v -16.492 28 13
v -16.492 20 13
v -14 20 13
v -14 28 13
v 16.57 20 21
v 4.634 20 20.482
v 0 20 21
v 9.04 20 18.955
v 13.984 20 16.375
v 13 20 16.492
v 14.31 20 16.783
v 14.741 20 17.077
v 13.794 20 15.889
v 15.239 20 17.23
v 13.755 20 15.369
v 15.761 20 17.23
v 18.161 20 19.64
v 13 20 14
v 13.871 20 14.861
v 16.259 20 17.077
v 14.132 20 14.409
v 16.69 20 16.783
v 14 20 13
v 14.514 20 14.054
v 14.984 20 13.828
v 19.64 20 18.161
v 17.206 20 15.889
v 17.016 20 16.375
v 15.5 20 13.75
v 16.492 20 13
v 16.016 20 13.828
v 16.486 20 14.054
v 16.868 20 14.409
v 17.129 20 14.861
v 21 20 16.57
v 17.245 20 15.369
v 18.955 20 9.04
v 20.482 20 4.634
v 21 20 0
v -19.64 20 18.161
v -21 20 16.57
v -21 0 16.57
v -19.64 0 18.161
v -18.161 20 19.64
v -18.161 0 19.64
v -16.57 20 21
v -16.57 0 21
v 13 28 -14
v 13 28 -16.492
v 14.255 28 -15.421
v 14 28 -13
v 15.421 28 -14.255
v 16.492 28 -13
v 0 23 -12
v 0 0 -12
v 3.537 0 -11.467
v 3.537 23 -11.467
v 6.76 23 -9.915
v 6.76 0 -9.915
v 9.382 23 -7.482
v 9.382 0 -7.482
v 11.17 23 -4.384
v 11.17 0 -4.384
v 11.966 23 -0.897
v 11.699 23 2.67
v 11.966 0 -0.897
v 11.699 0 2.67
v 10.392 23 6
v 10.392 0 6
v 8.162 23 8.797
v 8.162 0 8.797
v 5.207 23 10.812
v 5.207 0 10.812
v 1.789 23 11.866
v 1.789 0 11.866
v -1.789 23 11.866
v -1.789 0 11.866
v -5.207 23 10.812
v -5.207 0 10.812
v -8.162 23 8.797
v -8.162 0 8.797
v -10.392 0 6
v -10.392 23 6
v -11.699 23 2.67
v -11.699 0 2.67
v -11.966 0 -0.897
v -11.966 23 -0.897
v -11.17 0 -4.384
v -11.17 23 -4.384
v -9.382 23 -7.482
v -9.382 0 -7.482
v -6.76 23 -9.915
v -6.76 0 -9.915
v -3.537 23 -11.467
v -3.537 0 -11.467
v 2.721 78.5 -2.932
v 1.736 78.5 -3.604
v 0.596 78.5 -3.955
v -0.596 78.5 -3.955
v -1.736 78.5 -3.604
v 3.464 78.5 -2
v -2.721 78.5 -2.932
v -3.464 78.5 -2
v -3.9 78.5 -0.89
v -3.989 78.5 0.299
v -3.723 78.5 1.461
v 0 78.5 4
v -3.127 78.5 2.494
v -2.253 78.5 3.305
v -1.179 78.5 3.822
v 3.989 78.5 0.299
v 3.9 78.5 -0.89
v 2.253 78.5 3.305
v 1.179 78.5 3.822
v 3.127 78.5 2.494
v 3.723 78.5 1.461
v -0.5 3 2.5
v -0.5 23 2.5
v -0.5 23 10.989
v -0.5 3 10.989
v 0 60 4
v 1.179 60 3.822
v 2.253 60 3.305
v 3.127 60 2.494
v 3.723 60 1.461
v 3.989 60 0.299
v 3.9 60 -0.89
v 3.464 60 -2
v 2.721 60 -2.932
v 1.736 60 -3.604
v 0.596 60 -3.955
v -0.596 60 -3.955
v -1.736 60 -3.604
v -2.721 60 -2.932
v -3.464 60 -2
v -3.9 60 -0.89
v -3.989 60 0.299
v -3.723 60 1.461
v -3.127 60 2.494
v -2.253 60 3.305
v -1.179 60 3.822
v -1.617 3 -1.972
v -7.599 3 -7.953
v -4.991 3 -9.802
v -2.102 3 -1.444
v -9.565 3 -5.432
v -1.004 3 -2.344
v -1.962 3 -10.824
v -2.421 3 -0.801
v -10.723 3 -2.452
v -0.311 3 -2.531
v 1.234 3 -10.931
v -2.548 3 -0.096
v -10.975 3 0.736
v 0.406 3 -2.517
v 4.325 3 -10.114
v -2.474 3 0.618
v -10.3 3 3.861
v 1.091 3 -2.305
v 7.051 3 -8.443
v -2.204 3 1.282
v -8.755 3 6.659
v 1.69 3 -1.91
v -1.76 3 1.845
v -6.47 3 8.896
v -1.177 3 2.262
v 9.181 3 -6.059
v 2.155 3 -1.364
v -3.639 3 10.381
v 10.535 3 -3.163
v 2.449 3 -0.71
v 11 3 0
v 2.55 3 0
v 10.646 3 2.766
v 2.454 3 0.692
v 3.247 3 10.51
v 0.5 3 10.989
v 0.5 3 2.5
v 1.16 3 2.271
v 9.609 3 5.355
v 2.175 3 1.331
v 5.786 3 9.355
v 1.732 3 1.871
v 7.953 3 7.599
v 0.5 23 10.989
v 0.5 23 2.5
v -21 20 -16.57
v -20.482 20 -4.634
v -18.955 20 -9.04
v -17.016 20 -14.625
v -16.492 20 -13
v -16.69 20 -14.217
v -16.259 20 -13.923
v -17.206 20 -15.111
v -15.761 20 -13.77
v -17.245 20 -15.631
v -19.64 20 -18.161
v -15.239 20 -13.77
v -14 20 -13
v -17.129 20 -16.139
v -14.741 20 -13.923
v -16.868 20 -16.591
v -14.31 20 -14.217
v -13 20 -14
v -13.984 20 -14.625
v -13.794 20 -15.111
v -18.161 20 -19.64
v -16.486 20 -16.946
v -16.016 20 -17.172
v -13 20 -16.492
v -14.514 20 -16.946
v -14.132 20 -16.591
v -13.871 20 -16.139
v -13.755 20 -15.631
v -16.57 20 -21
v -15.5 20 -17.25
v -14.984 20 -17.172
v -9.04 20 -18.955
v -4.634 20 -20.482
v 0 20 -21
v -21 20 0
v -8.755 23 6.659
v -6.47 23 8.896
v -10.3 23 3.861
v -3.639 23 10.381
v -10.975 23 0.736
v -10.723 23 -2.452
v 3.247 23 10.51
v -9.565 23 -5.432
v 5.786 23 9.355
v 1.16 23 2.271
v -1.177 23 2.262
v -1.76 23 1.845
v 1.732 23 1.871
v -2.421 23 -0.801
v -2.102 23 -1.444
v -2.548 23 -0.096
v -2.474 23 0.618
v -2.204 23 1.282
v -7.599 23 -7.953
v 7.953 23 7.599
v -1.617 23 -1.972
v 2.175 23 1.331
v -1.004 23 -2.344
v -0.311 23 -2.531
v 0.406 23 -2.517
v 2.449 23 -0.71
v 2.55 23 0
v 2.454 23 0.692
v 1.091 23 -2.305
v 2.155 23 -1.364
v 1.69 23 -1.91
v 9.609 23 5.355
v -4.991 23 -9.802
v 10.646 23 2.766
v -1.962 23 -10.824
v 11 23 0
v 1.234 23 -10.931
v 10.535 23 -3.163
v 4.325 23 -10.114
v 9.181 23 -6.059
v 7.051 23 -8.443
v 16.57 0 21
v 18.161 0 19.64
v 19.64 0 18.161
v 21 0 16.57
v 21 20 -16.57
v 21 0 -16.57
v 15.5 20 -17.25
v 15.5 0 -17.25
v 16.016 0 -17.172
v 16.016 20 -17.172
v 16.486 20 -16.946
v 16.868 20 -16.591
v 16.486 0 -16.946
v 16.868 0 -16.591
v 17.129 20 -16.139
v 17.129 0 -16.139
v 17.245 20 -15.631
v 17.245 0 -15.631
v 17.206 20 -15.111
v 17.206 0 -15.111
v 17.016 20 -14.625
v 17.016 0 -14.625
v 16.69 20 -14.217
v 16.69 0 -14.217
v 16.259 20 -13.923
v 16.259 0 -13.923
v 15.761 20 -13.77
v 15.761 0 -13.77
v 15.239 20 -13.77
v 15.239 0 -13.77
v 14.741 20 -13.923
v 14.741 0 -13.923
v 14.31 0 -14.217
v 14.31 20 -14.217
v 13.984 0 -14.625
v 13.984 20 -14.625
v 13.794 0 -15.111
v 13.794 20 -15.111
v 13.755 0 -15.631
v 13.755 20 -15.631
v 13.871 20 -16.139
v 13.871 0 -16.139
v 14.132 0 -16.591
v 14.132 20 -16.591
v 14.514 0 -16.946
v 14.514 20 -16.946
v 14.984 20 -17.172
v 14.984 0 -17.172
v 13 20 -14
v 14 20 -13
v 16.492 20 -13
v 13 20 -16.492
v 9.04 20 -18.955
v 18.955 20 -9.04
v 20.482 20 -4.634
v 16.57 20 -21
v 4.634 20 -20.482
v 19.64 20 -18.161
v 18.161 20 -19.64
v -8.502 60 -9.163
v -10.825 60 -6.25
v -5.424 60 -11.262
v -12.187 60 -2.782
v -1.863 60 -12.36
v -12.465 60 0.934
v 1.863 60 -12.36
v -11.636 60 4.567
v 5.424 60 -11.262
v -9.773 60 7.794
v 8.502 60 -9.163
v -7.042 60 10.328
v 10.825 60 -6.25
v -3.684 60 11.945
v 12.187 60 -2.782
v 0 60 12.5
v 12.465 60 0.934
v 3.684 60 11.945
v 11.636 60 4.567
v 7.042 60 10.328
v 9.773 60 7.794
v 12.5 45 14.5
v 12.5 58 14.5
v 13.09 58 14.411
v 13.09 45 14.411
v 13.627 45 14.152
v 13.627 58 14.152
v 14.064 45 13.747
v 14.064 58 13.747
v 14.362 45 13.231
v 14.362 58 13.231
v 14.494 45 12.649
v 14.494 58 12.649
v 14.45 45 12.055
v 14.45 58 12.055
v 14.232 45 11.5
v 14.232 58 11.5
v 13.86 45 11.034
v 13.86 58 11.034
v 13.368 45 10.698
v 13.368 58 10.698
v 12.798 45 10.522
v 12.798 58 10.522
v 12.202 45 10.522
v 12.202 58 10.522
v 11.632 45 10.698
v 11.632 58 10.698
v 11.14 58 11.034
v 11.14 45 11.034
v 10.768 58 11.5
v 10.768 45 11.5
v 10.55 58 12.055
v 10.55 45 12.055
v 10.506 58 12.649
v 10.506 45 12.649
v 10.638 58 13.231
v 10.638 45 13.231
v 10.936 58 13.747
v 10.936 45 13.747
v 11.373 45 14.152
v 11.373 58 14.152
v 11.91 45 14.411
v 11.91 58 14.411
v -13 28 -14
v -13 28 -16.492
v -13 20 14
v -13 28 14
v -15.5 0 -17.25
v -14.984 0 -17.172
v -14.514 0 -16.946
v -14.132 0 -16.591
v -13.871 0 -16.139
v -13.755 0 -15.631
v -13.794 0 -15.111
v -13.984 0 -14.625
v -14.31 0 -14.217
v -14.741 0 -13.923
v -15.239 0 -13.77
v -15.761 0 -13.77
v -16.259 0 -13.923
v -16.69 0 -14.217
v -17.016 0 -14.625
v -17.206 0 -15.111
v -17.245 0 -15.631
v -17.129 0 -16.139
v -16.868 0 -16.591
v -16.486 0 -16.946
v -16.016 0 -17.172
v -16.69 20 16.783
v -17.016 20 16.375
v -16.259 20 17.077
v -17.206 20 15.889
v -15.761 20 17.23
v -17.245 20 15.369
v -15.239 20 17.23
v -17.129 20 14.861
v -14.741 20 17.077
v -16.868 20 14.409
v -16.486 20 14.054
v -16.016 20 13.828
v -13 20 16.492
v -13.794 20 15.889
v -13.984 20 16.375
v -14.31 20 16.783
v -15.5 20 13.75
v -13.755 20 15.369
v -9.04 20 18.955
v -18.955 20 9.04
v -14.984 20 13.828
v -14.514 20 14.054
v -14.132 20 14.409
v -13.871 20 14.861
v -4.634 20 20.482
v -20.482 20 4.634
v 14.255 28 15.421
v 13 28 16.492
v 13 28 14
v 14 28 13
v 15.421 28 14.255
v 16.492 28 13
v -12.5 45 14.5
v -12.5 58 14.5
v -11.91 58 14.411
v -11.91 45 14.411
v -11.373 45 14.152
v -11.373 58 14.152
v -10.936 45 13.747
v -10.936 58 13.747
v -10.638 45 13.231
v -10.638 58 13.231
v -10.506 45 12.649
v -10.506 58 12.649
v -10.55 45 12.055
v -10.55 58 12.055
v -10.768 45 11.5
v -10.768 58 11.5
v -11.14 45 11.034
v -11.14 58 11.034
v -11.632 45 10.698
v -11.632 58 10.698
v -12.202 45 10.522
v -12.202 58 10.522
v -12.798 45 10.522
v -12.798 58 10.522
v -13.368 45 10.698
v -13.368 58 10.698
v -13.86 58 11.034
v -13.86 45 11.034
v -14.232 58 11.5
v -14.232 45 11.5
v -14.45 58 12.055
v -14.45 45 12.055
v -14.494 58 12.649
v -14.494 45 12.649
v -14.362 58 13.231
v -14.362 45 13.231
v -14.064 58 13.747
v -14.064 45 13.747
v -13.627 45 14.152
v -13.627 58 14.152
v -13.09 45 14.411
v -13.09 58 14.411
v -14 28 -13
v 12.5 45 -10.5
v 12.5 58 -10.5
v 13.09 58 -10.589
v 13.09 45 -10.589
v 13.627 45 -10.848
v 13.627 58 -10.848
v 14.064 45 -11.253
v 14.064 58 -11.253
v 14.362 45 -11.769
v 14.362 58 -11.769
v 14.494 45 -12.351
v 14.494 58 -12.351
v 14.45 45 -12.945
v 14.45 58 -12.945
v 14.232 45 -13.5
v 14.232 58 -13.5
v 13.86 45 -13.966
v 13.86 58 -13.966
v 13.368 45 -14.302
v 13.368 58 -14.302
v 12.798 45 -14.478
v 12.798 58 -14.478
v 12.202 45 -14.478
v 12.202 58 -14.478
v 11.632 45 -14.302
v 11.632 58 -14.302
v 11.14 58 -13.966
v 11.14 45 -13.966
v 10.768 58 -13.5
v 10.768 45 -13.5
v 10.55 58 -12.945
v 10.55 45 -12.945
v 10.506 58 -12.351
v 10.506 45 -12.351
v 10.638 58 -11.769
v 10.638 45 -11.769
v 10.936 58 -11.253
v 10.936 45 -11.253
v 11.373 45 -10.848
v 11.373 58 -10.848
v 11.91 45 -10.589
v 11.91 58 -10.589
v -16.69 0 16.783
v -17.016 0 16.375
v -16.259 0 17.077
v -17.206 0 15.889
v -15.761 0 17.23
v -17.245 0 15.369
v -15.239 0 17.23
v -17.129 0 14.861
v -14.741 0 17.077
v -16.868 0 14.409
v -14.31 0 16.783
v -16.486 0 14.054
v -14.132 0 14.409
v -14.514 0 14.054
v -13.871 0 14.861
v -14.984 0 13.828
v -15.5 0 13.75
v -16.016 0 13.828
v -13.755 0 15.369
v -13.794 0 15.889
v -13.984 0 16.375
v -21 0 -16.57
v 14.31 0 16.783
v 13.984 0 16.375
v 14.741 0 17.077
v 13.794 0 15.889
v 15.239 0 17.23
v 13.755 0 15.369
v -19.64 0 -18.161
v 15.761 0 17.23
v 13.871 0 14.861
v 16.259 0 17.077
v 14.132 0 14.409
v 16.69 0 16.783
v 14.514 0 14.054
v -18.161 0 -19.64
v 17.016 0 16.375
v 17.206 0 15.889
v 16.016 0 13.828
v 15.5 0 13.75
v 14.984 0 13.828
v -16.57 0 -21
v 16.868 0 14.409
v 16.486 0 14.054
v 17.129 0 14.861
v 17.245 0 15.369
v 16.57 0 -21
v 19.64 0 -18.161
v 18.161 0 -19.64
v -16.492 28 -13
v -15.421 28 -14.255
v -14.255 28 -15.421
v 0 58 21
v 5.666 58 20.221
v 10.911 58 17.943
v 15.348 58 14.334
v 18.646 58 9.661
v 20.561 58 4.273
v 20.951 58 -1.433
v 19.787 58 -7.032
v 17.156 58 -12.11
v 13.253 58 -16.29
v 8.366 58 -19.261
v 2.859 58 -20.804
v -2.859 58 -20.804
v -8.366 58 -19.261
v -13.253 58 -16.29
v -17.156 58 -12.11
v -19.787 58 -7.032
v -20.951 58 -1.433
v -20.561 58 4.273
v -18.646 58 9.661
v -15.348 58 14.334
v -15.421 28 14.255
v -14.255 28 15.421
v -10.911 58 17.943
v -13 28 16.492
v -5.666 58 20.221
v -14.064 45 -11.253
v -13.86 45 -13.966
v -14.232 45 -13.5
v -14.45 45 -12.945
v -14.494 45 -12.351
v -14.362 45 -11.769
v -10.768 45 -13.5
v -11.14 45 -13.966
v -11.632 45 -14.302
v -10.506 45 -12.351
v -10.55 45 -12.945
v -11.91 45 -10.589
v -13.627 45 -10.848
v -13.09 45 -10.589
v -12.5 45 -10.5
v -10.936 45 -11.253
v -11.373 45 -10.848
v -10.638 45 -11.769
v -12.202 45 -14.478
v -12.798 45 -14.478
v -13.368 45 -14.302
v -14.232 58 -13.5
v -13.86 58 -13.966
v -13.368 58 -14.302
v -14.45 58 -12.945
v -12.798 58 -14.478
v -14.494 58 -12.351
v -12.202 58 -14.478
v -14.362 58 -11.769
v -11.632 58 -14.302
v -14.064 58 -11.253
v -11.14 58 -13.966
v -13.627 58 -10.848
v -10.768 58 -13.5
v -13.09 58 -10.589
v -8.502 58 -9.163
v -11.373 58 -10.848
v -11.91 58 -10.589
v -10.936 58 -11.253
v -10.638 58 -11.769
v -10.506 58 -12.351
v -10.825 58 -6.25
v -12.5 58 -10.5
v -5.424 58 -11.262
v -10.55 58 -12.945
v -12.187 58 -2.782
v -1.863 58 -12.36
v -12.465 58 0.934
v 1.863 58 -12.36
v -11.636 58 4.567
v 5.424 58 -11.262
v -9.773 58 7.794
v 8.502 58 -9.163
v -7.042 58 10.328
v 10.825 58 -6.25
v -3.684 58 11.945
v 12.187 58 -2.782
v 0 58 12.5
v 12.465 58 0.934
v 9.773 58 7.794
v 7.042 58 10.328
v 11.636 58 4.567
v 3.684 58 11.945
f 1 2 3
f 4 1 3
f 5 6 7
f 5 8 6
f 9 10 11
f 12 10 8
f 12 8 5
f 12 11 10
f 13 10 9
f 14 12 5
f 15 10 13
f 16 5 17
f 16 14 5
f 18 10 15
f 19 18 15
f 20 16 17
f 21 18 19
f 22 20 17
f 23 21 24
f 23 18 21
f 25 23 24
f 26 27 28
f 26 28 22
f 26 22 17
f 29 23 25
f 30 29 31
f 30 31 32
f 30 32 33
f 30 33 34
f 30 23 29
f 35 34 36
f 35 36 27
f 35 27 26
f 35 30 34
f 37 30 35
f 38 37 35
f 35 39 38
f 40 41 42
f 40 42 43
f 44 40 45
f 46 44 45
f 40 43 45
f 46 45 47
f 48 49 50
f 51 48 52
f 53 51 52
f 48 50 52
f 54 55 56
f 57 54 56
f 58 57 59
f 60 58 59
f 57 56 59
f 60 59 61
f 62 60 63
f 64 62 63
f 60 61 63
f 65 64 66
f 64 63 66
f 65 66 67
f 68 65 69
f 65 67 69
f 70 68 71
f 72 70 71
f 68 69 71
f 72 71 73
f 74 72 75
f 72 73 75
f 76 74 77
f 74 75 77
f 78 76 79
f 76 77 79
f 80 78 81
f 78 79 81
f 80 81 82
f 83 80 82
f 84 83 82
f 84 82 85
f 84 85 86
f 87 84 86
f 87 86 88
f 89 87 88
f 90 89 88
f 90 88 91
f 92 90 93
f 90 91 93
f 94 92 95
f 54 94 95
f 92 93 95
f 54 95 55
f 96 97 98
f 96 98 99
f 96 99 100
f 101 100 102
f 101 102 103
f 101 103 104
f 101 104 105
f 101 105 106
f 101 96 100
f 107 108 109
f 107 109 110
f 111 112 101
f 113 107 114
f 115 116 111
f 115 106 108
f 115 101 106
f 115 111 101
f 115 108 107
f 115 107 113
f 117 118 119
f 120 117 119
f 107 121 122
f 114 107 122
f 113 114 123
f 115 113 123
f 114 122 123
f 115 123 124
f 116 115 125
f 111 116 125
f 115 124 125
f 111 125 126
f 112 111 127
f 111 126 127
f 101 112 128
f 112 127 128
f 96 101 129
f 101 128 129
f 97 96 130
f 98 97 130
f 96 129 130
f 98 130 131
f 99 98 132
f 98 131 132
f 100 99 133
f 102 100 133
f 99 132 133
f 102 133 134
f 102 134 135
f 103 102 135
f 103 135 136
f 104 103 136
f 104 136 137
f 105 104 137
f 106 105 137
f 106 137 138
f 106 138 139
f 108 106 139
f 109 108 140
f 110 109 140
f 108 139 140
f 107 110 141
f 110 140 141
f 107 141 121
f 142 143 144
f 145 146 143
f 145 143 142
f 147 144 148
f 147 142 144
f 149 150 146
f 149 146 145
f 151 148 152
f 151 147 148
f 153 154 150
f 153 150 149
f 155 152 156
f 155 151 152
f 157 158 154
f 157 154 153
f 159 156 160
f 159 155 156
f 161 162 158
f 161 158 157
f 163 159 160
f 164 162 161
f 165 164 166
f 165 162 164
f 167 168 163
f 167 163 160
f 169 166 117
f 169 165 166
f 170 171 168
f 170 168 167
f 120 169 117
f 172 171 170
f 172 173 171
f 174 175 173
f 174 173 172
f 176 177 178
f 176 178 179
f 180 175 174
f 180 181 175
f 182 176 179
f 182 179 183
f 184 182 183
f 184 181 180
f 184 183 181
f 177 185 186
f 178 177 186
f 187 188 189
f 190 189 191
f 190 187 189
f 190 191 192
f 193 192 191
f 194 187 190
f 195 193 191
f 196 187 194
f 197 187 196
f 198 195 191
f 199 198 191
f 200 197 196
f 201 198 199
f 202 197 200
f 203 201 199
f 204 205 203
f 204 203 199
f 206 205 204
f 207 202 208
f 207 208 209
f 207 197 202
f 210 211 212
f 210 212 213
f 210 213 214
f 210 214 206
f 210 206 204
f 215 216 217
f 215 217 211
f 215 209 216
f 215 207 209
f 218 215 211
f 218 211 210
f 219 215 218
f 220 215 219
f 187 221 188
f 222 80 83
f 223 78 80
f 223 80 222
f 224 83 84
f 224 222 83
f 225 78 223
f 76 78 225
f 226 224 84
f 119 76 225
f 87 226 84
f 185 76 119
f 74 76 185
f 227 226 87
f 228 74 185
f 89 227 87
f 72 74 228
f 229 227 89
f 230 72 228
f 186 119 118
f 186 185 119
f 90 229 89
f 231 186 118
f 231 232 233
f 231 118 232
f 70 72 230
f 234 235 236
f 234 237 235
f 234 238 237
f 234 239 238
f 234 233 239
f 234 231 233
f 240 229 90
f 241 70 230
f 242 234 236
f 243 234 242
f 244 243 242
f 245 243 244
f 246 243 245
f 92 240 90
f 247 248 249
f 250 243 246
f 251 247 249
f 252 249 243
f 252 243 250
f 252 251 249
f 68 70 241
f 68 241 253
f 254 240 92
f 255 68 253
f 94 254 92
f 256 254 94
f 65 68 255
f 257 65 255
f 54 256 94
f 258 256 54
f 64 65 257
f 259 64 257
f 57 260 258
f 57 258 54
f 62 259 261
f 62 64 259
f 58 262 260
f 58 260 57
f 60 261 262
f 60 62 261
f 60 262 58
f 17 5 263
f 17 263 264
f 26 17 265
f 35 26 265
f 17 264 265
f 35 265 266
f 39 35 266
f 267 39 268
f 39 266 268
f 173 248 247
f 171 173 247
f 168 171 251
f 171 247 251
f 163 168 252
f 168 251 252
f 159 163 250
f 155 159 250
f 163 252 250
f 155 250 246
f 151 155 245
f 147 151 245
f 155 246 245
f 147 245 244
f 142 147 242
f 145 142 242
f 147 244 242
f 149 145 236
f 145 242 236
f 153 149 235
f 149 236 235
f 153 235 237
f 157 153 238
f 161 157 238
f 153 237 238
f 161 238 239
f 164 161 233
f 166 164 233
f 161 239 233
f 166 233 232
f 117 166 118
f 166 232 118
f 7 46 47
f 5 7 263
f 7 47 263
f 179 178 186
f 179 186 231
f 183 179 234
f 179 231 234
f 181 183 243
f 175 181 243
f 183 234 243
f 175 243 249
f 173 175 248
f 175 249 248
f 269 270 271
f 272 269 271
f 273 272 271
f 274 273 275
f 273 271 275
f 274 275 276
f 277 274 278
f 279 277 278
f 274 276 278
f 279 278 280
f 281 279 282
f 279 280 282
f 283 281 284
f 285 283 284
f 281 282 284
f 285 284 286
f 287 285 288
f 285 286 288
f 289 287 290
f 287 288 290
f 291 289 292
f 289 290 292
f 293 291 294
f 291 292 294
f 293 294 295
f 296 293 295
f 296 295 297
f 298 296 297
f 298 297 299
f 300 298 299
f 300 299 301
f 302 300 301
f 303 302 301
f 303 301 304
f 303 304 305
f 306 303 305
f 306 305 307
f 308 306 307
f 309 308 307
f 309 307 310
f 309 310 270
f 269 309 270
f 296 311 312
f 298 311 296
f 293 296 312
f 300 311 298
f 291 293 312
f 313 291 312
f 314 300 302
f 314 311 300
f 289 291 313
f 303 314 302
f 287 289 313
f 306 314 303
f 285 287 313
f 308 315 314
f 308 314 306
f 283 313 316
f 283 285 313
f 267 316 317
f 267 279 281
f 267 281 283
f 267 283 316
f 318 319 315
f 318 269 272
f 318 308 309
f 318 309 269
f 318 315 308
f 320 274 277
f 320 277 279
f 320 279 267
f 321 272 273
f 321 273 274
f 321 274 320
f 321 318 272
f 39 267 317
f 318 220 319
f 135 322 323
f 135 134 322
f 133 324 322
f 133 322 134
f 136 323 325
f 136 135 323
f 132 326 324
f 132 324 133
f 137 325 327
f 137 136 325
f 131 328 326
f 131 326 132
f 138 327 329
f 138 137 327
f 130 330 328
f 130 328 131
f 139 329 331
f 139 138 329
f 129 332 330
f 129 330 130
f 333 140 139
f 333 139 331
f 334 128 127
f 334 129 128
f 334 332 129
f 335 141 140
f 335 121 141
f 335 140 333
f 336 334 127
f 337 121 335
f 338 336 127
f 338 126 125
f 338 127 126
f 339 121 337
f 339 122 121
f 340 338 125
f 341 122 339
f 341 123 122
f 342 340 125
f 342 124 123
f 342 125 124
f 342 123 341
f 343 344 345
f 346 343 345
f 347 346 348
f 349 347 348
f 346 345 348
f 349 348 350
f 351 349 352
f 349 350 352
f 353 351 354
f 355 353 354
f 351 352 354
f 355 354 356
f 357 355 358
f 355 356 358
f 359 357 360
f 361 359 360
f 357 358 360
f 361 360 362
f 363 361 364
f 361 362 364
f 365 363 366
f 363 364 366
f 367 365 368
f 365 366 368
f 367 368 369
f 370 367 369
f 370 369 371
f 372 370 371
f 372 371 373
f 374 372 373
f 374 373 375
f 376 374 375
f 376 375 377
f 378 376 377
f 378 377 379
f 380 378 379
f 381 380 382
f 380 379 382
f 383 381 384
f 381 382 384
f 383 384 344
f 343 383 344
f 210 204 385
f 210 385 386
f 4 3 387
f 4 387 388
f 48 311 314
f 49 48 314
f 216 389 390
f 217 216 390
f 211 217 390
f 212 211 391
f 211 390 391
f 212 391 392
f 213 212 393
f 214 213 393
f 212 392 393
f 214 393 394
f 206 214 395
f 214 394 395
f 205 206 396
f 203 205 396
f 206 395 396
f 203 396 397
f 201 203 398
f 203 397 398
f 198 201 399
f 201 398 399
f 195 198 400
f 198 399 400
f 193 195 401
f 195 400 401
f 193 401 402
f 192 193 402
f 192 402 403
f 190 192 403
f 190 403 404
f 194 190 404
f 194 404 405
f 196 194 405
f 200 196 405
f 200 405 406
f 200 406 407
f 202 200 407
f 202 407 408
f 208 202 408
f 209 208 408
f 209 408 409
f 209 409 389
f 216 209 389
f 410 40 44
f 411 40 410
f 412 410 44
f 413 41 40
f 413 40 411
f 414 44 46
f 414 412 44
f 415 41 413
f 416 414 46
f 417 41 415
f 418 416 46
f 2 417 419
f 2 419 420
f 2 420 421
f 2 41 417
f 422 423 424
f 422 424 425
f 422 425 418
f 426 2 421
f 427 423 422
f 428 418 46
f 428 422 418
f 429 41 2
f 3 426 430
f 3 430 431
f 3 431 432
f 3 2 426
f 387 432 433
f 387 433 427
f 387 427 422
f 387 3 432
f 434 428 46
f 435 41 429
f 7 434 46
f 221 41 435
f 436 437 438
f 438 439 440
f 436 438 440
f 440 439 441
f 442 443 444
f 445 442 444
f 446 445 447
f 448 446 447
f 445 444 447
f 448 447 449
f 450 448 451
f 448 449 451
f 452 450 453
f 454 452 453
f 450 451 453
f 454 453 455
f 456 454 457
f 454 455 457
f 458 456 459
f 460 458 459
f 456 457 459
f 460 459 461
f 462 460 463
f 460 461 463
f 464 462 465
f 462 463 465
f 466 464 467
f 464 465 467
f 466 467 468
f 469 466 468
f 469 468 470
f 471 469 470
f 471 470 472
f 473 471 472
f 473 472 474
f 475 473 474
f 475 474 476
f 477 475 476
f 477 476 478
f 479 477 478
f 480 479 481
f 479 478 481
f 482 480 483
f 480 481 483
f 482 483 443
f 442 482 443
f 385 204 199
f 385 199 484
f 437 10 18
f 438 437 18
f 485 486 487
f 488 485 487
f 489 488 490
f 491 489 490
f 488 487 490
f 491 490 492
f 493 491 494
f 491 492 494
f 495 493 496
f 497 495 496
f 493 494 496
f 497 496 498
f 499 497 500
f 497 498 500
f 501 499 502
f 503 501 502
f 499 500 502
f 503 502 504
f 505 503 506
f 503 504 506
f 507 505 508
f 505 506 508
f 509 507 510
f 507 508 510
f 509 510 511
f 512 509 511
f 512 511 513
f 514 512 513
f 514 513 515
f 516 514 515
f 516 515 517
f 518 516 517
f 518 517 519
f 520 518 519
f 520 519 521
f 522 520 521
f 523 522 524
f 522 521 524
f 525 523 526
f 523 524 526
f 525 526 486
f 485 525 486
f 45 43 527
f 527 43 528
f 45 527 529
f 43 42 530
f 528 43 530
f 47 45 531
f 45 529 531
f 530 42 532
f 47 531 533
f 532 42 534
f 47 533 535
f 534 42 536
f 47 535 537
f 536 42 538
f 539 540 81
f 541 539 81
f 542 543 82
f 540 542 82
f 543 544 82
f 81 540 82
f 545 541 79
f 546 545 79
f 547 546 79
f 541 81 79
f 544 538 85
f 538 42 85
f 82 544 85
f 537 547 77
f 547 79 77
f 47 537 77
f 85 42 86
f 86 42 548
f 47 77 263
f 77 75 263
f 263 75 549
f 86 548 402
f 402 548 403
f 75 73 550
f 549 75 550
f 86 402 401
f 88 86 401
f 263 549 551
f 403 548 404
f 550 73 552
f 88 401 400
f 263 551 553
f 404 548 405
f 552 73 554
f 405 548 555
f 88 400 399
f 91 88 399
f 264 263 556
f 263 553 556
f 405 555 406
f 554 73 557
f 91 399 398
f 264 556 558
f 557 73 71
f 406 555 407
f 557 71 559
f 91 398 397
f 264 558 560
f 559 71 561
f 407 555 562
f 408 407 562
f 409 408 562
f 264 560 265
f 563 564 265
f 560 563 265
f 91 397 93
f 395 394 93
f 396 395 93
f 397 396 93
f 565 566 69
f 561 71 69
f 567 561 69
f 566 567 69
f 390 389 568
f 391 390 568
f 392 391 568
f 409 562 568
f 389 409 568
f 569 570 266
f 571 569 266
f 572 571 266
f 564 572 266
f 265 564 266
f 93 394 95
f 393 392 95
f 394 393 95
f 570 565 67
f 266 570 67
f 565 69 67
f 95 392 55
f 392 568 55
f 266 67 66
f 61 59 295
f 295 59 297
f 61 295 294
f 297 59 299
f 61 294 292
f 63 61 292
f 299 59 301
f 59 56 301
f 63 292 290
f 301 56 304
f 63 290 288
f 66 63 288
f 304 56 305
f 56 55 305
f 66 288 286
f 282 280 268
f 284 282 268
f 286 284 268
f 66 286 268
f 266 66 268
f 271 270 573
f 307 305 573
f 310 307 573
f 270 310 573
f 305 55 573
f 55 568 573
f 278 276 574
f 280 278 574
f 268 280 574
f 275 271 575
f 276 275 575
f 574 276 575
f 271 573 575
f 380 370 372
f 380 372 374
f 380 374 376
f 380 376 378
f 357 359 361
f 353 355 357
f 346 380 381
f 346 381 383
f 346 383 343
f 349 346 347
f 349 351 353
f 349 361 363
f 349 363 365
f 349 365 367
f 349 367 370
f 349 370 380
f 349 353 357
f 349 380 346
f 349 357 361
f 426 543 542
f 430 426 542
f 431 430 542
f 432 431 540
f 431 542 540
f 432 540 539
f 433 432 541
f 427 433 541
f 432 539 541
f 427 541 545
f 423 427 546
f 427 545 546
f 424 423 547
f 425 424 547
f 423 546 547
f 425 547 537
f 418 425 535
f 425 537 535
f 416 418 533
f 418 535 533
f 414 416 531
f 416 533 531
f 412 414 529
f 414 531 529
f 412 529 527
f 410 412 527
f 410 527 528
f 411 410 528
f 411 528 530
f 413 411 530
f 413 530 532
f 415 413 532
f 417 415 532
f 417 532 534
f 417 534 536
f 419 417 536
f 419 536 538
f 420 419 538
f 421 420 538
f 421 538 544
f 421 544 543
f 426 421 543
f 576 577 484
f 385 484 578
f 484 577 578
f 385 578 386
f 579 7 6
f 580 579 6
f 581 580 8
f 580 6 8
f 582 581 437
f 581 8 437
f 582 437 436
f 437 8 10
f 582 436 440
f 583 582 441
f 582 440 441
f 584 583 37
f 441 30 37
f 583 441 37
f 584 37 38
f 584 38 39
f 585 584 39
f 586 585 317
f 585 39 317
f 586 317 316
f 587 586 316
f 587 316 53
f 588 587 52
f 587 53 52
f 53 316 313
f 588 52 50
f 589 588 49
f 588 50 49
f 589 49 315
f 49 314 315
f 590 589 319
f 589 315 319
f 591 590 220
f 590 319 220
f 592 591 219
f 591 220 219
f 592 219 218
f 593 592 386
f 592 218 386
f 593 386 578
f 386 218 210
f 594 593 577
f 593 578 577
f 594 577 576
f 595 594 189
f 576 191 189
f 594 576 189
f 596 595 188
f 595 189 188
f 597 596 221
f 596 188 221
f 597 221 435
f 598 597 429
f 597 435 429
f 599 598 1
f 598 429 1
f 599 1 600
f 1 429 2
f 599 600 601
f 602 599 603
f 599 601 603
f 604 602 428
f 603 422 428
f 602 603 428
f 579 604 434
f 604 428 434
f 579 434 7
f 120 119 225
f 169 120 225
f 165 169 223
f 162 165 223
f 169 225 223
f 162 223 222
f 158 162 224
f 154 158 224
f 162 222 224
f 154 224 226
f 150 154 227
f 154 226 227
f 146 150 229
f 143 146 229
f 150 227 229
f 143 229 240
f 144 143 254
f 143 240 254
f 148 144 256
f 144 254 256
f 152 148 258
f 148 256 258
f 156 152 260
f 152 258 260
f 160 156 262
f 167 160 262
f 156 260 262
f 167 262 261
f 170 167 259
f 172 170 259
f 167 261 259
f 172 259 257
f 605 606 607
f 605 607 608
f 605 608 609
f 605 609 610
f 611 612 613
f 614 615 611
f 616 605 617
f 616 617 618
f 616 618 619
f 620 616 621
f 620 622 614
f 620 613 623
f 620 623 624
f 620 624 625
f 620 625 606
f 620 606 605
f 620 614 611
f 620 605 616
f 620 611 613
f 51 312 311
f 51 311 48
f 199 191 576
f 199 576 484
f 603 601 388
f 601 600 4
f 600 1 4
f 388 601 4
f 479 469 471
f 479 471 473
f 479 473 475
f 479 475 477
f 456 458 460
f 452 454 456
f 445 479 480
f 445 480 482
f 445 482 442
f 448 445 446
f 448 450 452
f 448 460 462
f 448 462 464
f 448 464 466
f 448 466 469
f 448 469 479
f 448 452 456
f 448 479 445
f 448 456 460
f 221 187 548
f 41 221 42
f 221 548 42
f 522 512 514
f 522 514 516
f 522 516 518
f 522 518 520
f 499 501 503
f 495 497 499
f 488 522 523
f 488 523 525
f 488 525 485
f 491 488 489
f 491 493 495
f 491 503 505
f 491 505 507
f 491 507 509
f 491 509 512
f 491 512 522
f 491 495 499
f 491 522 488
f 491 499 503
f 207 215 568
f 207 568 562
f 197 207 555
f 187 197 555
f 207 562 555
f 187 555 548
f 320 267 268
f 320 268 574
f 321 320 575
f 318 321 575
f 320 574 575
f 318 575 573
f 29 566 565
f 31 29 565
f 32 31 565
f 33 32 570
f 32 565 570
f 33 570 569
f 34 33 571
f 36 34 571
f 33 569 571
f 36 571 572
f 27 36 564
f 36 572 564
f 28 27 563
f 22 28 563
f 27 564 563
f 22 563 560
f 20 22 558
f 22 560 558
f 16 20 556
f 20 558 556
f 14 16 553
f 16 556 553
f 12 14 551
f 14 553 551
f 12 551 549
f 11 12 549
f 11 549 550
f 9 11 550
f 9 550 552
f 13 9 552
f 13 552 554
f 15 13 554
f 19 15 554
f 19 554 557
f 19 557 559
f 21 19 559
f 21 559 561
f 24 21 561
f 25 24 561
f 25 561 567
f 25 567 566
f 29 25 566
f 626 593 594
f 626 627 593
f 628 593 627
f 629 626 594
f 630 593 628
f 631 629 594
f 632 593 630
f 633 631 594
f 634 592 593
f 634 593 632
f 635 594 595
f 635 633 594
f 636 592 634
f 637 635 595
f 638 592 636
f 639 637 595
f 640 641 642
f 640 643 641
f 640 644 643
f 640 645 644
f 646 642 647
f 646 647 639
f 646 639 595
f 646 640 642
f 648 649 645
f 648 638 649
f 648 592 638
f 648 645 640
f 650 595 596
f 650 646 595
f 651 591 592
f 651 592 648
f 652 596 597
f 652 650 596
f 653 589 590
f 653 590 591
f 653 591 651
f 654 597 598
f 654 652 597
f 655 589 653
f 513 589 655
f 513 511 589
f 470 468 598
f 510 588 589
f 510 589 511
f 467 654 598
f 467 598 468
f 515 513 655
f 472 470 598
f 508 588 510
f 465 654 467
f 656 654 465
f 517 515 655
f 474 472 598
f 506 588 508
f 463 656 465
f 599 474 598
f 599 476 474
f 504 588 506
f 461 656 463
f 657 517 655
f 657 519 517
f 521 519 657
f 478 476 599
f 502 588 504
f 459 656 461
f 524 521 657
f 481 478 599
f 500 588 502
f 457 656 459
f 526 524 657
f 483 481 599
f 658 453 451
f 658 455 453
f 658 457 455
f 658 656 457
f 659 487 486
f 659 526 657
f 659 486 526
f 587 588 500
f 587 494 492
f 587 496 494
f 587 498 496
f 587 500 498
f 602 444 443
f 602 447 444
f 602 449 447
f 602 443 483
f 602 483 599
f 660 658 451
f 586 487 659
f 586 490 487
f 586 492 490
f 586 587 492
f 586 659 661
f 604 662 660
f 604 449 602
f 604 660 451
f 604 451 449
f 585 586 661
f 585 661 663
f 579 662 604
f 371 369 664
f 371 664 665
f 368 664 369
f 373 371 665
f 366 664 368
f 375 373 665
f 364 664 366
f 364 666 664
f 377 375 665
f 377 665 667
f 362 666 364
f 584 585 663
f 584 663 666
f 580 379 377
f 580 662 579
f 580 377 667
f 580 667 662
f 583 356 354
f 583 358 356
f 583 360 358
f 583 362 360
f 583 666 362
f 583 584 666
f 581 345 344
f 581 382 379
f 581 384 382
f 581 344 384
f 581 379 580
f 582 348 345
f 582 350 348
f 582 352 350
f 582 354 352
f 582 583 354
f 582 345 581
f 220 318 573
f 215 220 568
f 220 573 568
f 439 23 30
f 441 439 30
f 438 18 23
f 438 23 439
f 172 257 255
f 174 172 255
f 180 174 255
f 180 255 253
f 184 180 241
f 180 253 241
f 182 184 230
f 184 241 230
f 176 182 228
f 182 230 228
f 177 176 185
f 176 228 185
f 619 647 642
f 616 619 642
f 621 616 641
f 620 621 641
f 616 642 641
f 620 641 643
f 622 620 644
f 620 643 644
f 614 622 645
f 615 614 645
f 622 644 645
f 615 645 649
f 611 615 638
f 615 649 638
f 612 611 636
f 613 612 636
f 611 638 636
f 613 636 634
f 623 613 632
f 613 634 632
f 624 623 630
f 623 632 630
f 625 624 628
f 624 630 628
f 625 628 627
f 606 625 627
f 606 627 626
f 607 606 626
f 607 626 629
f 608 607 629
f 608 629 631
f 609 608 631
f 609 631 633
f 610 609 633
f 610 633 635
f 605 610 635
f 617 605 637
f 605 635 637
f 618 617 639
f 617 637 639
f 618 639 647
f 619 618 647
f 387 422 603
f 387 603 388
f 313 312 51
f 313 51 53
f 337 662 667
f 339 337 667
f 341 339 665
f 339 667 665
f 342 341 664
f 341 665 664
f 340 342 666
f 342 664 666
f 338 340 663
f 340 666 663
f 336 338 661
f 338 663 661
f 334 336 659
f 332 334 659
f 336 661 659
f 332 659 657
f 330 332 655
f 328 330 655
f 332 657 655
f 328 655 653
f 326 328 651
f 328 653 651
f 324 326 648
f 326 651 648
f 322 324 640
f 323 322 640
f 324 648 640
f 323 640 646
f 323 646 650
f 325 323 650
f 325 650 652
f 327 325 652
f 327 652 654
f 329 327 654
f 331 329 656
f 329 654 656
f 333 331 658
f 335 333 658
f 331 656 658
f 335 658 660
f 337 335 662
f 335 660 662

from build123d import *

# Parameters (mm, degrees)
EXTRUDE_1_DEPTH     = 20
SKETCH_2_R          = 21
EXTRUDE_2_DEPTH     = 38
SKETCH_3_R          = 12.5
EXTRUDE_3_DEPTH     = 2
SKETCH_4_R          = 4
EXTRUDE_4_DEPTH     = 18.5
SKETCH_5_R          = 1.75
CUT_EXTRUDE_1_DEPTH = 22.5
SKETCH_6_W          = 5
SKETCH_6_H          = 5
CUT_EXTRUDE_2_DEPTH = 8
CHAMFER_1_SIZE      = 1
SKETCH_7_R          = 12
CUT_EXTRUDE_3_DEPTH = 23
EXTRUDE_5_DEPTH     = 20
SKETCH_9_R          = 2
CUT_EXTRUDE_4_DEPTH = 13


with BuildPart() as part:
    # 草图1 → 凸台-拉伸1 (new body)
    with BuildSketch(Plane(origin=(0, 0, 0), x_dir=(1, 0, 0), z_dir=(0, 1, 0))):
        with BuildLine():
            Line((16.56992758, 21), (-16.56992758, 21))
            ThreePointArc((-16.56992758, 21), (-18.915106397, 18.915106397), (-21, 16.56992758))
            Line((-21, 16.56992758), (-21, -16.56992758))
            ThreePointArc((-21, -16.56992758), (-18.915106397, -18.915106397), (-16.56992758, -21))
            Line((-16.56992758, -21), (16.56992758, -21))
            ThreePointArc((16.56992758, -21), (18.915106397, -18.915106397), (21, -16.56992758))
            Line((21, -16.56992758), (21, 16.56992758))
            ThreePointArc((21, 16.56992758), (18.915106397, 18.915106397), (16.56992758, 21))
        make_face()
    extrude(amount=EXTRUDE_1_DEPTH)

    # 草图2 → 凸台-拉伸2 (add)
    with BuildSketch(Plane(origin=(0, 20, 0), x_dir=(1, 0, 0), z_dir=(0, 1, 0))):
        with Locations(Location((0, 0, 0), (0, 0, 270))):
            Circle(SKETCH_2_R)
    extrude(amount=EXTRUDE_2_DEPTH)

    # 草图3 → 凸台-拉伸3 (add)
    with BuildSketch(Plane(origin=(0, 58, 0), x_dir=(1, 0, 0), z_dir=(0, 1, 0))):
        with Locations(Location((0, 0, 0), (0, 0, 270))):
            Circle(SKETCH_3_R)
    extrude(amount=EXTRUDE_3_DEPTH)

    # 草图4 → 凸台-拉伸4 (add)
    with BuildSketch(Plane(origin=(0, 60, 0), x_dir=(1, 0, 0), z_dir=(0, 1, 0))):
        with Locations(Location((0, 0, 0), (0, 0, 270))):
            Circle(SKETCH_4_R)
    extrude(amount=EXTRUDE_4_DEPTH)

    # 草图5 → 切除-拉伸1 (cut)
    with BuildSketch(Plane.XZ):
        with Locations(Location((15.5, 15.5, 0), (0, 0, 270))):
            Circle(SKETCH_5_R)
        with Locations(Location((15.5, -15.5, 0), (0, 0, 270))):
            Circle(SKETCH_5_R)
        with Locations(Location((-15.5, -15.5, 0), (0, 0, 270))):
            Circle(SKETCH_5_R)
        with Locations(Location((-15.5, 15.5, 0), (0, 0, 270))):
            Circle(SKETCH_5_R)
    extrude(amount=-CUT_EXTRUDE_1_DEPTH, mode=Mode.SUBTRACT)

    # 草图6 → 切除-拉伸2 (cut)
    with BuildSketch(Plane(origin=(0, 20, 0), x_dir=(1, 0, 0), z_dir=(0, 1, 0))):
        with Locations((-15.5, -15.5)):
            Rectangle(SKETCH_6_W, SKETCH_6_H)
        with Locations((15.5, -15.5)):
            Rectangle(SKETCH_6_W, SKETCH_6_H)
        with Locations((-15.5, 15.5)):
            Rectangle(SKETCH_6_W, SKETCH_6_H)
        with Locations((15.5, 15.5)):
            Rectangle(SKETCH_6_W, SKETCH_6_H)
    extrude(amount=CUT_EXTRUDE_2_DEPTH, mode=Mode.SUBTRACT)

    # 倒角1
    chamfer_1_edges = [part.edges().sort_by_distance(p)[0] for p in [
        (13, 24, -13),
        (-13, 24, -13),
        (-13, 24, 13),
        (13, 24, 13),
    ]]
    chamfer(chamfer_1_edges, length=CHAMFER_1_SIZE)

    # 草图7 → 切除-拉伸3 (cut)
    with BuildSketch(Plane.XZ):
        with Locations(Location((0, 0, 0), (0, 0, 270))):
            Circle(SKETCH_7_R)
    extrude(amount=-CUT_EXTRUDE_3_DEPTH, mode=Mode.SUBTRACT)

    # 草图8 → 凸台-拉伸5 (add)
    with BuildSketch(Plane.XZ.offset(-23)):
        with BuildLine():
            ThreePointArc((2.55, 0), (-1.616709621, -1.971991379), (-0.5, 2.50049995))
            Line((-0.5, 2.50049995), (-0.5, 10.988630488))
            ThreePointArc((-0.5, 10.988630488), (-7.599342077, -7.95298686), (11, 0))
            ThreePointArc((11, 0), (7.95298686, 7.599342077), (0.5, 10.988630488))
            Line((0.5, 10.988630488), (0.5, 2.50049995))
            ThreePointArc((0.5, 2.50049995), (1.971991379, 1.616709621), (2.55, 0))
        make_face()
    extrude(amount=EXTRUDE_5_DEPTH)

    # 草图9 → 切除-拉伸4 (cut)
    with BuildSketch(Plane(origin=(0, 58, 0), x_dir=(1, 0, 0), z_dir=(0, 1, 0))):
        with Locations(Location((12.5, 12.5, 0), (0, 0, 270))):
            Circle(SKETCH_9_R)
        with Locations(Location((12.5, -12.5, 0), (0, 0, 270))):
            Circle(SKETCH_9_R)
        with Locations(Location((-12.5, -12.5, 0), (0, 0, 270))):
            Circle(SKETCH_9_R)
        with Locations(Location((-12.5, 12.5, 0), (0, 0, 270))):
            Circle(SKETCH_9_R)
    extrude(amount=-CUT_EXTRUDE_4_DEPTH, mode=Mode.SUBTRACT)


solid = part.part
